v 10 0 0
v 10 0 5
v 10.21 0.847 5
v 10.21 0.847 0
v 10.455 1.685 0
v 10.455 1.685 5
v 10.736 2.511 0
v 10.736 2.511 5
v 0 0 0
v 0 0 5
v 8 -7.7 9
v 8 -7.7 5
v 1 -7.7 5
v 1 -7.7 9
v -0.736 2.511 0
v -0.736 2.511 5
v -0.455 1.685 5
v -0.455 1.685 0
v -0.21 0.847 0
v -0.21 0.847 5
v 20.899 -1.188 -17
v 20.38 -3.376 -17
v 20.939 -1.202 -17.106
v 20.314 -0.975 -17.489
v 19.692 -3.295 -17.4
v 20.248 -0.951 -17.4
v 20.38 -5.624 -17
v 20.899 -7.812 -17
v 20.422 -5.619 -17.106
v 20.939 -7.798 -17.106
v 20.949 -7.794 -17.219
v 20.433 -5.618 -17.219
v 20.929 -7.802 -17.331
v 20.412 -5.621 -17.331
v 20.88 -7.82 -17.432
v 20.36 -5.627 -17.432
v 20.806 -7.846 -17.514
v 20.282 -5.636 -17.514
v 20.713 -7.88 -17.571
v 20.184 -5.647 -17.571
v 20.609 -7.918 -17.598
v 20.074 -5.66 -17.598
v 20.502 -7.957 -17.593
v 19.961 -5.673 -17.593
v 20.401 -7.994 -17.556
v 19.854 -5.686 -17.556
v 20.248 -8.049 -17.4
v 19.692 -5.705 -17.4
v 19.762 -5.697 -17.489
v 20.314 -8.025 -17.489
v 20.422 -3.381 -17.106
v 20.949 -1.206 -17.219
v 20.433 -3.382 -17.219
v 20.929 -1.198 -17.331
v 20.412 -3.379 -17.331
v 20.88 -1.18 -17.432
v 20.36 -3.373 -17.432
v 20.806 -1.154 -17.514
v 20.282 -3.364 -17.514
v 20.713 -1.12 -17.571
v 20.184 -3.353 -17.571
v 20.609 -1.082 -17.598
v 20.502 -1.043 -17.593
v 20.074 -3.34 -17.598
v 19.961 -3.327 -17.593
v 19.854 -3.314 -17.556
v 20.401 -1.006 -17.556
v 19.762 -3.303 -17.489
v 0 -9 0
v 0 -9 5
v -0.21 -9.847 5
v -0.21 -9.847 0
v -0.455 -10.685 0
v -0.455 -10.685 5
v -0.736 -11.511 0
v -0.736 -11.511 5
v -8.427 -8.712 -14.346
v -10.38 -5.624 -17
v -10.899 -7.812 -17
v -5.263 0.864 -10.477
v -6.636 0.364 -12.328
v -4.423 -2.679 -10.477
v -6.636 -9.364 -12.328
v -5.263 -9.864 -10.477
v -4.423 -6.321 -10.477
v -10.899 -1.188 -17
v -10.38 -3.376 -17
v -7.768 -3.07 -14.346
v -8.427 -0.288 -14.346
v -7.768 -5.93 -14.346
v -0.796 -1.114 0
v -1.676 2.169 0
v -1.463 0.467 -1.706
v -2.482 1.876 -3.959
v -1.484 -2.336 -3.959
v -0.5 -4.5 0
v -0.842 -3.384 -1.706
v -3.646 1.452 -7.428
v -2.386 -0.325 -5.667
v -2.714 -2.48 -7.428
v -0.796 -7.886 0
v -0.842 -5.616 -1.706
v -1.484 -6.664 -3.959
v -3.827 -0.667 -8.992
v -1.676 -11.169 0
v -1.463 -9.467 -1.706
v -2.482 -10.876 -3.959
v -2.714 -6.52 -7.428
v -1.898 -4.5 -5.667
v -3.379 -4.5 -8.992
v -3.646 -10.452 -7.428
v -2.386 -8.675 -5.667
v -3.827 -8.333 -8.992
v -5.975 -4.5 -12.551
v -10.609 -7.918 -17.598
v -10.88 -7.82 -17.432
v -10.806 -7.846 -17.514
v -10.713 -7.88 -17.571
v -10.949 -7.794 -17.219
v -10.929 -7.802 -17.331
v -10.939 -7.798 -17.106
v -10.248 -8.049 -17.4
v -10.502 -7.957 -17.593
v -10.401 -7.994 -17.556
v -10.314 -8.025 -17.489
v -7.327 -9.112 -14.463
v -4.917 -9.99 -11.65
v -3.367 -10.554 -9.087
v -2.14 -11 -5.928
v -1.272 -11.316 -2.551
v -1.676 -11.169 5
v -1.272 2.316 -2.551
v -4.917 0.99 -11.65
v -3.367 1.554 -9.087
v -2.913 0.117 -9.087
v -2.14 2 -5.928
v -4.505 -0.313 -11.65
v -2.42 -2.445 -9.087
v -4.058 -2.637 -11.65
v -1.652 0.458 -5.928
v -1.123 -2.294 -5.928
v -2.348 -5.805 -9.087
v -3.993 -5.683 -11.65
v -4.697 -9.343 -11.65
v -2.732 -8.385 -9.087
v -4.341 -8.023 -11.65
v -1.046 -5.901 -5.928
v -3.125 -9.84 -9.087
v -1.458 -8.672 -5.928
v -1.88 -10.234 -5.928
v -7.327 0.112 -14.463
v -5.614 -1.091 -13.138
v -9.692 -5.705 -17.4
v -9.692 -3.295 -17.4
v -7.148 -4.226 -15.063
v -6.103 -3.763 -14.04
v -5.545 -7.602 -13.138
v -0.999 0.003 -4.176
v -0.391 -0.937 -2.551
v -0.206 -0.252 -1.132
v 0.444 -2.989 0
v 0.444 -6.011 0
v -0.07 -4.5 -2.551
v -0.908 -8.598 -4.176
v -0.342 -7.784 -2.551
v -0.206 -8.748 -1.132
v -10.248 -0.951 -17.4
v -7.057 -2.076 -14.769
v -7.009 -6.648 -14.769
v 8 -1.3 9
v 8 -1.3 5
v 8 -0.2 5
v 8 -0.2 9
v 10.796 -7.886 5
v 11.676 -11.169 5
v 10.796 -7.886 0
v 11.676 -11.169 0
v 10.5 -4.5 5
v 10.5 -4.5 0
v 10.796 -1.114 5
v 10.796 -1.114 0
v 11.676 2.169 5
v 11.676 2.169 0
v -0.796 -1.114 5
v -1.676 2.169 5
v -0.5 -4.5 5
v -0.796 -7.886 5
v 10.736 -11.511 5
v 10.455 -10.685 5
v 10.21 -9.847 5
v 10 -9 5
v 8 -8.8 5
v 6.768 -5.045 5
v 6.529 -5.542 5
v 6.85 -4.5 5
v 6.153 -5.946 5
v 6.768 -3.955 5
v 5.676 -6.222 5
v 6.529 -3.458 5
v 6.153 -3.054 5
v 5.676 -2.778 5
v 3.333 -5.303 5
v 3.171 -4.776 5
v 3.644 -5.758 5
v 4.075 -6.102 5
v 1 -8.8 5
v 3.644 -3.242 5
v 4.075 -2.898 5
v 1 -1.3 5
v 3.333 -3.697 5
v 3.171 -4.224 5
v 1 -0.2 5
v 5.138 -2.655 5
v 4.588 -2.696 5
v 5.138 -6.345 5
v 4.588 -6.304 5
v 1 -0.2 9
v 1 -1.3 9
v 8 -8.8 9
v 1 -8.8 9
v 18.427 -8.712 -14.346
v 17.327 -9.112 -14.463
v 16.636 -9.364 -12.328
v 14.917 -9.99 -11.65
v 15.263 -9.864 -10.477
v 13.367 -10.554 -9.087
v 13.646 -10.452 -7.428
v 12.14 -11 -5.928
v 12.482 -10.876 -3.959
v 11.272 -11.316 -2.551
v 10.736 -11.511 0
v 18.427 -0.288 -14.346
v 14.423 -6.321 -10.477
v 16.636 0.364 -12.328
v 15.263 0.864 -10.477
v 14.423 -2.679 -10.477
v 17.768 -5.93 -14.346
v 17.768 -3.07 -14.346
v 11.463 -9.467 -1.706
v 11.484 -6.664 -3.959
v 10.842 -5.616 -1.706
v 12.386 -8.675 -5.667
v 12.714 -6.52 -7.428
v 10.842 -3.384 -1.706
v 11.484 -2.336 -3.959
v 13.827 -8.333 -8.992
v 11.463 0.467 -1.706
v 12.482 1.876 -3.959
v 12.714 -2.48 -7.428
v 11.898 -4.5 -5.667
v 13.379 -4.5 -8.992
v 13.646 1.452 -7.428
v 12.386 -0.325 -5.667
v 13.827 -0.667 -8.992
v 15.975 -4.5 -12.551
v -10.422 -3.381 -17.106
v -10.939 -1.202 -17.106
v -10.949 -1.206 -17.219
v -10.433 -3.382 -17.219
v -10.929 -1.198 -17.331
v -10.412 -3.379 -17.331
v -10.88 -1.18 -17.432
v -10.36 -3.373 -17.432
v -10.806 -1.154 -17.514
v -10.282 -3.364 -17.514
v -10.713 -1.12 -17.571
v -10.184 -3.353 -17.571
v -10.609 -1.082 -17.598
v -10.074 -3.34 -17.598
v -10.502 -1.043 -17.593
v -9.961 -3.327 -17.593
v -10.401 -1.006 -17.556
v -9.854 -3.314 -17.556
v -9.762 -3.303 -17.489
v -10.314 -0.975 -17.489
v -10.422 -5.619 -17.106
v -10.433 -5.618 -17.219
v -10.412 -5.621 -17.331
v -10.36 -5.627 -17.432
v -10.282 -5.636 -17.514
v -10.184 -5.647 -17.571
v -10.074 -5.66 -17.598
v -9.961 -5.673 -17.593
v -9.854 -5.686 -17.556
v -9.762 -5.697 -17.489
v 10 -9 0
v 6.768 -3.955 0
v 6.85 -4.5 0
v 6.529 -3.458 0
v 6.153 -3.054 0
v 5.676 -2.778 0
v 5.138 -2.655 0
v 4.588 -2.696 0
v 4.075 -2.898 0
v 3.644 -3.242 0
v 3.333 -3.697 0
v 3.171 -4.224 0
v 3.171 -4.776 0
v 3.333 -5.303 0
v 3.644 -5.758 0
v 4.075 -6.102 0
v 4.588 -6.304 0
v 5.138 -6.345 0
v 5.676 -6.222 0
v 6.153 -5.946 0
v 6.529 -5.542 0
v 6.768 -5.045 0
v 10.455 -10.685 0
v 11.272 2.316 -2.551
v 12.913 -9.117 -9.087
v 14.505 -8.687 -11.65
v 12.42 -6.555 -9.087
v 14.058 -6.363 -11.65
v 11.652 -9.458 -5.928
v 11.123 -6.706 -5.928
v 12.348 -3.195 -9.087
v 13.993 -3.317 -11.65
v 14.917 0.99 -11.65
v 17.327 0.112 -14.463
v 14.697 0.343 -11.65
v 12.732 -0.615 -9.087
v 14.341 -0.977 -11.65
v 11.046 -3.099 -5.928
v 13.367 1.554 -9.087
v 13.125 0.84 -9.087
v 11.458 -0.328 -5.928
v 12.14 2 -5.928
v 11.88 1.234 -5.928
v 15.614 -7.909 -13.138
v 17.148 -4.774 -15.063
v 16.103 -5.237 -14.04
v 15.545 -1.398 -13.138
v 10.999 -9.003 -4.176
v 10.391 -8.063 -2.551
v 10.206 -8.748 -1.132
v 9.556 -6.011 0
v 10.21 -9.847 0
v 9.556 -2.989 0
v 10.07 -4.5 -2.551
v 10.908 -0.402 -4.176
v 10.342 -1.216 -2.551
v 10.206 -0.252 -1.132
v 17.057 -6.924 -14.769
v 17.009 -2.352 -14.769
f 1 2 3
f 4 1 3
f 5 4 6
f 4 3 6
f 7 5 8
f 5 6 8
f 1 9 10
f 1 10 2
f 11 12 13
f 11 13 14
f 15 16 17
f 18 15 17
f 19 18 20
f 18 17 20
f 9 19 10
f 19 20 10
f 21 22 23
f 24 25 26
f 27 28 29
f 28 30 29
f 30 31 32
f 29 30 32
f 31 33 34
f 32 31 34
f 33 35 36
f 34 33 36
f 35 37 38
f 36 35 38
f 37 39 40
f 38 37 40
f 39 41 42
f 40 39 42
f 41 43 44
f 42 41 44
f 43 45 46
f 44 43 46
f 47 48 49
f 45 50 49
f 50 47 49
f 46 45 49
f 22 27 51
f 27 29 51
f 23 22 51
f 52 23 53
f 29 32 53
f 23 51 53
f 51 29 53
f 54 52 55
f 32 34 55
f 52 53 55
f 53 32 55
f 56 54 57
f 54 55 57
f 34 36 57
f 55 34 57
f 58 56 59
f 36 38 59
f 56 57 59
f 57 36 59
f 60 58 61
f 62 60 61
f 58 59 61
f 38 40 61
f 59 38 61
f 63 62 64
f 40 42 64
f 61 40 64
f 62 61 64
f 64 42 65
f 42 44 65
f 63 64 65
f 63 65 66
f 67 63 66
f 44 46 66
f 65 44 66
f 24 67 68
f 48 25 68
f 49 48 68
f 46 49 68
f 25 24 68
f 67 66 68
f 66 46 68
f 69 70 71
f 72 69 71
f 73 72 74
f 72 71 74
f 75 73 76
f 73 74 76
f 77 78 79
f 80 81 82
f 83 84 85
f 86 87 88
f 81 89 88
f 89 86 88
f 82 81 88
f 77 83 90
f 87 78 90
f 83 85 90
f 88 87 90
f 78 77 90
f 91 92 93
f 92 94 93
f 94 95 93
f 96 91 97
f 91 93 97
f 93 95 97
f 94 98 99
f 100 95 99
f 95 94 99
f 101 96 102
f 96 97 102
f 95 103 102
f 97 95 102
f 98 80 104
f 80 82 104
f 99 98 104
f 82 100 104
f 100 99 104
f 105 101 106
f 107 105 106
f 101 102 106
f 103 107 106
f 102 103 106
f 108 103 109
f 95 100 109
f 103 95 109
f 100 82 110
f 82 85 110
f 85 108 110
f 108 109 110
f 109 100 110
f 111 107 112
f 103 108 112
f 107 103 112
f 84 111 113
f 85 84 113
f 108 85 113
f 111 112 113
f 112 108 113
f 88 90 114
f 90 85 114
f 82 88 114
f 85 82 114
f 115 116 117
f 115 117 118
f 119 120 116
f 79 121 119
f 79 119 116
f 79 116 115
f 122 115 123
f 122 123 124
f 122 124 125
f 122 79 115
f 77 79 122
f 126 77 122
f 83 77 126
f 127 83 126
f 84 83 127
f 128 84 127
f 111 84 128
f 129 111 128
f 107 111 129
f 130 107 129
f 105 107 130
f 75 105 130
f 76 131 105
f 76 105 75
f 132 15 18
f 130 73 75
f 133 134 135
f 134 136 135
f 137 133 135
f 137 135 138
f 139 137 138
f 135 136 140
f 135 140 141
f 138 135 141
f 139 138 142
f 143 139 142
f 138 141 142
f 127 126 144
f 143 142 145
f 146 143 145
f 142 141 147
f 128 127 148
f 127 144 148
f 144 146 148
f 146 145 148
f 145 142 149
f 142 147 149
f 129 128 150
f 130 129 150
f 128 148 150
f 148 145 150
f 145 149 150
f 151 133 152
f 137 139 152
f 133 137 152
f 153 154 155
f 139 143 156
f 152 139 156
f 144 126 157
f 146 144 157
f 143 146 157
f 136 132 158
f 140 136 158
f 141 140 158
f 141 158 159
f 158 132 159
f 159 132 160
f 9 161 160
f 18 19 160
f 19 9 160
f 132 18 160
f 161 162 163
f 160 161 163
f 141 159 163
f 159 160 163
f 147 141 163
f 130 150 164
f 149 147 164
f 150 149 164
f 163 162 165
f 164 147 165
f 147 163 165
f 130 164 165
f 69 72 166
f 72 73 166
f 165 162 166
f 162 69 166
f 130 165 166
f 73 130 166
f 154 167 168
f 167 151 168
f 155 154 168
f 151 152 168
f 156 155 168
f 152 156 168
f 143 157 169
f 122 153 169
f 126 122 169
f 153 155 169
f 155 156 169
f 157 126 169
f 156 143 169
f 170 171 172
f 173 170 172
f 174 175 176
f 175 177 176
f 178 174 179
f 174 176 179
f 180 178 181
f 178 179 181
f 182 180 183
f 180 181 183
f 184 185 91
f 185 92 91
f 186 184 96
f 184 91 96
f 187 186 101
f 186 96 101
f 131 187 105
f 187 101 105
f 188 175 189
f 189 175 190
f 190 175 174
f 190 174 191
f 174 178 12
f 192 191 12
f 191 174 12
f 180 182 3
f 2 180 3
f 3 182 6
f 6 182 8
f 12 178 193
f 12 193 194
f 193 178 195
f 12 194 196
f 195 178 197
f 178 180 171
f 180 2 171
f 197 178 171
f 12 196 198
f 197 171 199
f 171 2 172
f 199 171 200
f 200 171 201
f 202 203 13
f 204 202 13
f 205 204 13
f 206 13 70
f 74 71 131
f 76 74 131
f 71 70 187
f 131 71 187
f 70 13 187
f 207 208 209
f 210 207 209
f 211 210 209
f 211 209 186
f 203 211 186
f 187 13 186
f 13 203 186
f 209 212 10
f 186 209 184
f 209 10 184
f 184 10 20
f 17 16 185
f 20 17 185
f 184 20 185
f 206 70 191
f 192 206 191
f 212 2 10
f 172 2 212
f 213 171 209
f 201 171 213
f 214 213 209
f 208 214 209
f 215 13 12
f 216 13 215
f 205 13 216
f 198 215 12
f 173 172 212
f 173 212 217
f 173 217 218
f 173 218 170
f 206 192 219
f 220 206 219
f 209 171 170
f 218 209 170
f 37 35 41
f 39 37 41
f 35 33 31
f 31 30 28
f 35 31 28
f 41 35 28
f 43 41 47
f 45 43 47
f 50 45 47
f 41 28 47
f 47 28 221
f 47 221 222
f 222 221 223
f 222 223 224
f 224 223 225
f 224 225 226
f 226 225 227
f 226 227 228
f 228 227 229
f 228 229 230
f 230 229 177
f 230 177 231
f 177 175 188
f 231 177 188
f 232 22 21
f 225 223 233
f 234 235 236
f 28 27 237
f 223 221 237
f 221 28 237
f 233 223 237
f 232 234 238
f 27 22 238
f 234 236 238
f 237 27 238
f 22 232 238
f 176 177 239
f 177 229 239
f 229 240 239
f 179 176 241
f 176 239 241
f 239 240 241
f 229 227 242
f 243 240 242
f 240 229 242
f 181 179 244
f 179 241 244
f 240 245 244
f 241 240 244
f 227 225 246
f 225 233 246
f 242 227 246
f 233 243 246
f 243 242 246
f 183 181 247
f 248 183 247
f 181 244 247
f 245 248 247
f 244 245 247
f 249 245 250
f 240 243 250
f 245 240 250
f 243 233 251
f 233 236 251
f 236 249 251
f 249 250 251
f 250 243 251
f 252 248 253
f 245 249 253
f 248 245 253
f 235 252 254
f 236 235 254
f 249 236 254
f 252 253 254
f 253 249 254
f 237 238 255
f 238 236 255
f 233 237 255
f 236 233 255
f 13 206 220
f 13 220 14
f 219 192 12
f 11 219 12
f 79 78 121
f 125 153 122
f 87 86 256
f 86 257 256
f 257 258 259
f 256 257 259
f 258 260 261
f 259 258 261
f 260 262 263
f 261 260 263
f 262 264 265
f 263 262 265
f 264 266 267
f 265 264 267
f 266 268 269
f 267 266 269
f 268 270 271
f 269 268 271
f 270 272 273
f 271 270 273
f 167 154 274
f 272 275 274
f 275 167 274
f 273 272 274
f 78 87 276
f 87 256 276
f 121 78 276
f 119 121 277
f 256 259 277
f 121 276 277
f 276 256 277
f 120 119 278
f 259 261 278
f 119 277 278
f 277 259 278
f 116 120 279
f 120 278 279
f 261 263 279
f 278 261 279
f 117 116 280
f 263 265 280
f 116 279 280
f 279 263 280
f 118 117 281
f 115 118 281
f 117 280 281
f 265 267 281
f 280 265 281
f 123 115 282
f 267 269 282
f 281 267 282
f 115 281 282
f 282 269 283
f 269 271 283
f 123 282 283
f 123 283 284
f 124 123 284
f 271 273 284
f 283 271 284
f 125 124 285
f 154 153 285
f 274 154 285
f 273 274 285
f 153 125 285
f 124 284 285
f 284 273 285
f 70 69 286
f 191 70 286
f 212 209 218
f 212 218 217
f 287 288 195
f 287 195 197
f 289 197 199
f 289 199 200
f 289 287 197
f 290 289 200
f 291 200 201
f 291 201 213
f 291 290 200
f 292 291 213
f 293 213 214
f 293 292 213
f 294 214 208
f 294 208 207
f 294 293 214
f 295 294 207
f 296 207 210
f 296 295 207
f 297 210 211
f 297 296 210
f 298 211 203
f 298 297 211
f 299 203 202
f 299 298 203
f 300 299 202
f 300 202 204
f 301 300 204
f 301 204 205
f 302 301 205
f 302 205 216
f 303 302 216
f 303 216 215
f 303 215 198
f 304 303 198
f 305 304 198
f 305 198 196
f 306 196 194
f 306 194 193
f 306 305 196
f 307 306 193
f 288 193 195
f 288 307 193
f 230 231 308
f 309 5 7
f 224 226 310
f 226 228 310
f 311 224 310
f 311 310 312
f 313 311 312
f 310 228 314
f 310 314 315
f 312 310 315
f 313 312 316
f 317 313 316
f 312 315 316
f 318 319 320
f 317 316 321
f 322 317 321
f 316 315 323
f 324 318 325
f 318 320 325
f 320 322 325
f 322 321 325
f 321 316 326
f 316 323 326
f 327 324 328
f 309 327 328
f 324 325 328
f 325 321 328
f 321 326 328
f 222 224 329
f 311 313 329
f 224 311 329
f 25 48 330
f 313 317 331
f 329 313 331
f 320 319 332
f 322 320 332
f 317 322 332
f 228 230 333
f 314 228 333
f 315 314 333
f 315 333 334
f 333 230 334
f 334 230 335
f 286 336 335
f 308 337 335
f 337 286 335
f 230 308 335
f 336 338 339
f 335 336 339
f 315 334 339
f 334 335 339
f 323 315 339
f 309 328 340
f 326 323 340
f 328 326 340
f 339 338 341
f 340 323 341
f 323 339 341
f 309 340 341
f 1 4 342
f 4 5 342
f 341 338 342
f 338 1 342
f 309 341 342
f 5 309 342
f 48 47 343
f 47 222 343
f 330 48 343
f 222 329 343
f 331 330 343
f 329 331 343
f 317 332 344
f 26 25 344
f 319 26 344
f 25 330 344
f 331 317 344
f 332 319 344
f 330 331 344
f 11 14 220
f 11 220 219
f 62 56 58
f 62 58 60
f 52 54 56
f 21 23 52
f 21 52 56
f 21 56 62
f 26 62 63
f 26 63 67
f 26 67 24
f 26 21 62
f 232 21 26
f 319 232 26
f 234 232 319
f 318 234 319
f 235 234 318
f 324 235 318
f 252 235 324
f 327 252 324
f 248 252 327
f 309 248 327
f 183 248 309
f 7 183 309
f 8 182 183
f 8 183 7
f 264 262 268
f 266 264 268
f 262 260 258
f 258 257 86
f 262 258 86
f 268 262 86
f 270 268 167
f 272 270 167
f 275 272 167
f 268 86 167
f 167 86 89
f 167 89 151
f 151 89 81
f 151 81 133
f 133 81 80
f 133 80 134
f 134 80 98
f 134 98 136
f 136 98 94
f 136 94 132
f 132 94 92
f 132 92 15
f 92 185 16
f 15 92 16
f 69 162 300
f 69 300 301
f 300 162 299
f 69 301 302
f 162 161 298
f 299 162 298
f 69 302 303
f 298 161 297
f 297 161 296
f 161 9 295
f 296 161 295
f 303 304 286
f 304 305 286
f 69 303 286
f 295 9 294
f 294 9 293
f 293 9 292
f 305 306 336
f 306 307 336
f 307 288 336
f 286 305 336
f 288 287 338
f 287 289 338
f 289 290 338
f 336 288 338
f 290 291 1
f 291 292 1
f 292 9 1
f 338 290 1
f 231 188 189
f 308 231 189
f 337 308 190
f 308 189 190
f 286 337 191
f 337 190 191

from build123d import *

# Parameters (mm, degrees)
F0_W          = 10
F0_H          = 9
F0_R          = 1.85
F1_DEPTH      = 5
F5_ANGLE_BACK = 20
F5_ANGLE      = 40
F6_W          = 7
F6_H          = 1.5
F7_DEPTH      = 4
F8_W          = 0.2
F8_H          = 4
F9_DEPTH      = 25
F10_COUNT     = 2


with BuildPart() as f1:
    # F0 (on Top) → F1 (new body)
    with BuildSketch(Plane.XY):
        with Locations((5, -4.5)):
            Rectangle(F0_W, F0_H)
        with Locations((5, -4.5)):
            Circle(F0_R, mode=Mode.SUBTRACT)
    extrude(amount=F1_DEPTH)

    # F6 (on face) → F7 (join)
    with BuildSketch(Plane.XY.offset(5)):
        with Locations((4.5, -8.25)):
            Rectangle(F6_W, F6_H)
        with Locations((4.5, -0.75)):
            Rectangle(F6_W, F6_H)
    extrude(amount=F7_DEPTH)

    # F8 (on face) → F9 (cut)
    with BuildSketch(Plane.YZ.offset(10)):
        with Locations((-7.6, 7)):
            Rectangle(F8_W, F8_H)
        with Locations((-8.9, 7)):
            Rectangle(F8_W, F8_H)
        with Locations((-0.1, 7)):
            Rectangle(F8_W, F8_H)
        with Locations((-1.4, 7)):
            Rectangle(F8_W, F8_H)
    extrude(amount=-F9_DEPTH, mode=Mode.SUBTRACT)



with BuildPart() as f5:
    # F3 (on offset) → F5 (revolve)
    with BuildSketch(Plane.XZ.offset(4.5), mode=Mode.PRIVATE) as f5_sk:
        with BuildLine():
            Line((0.5, 5), (0, 5))
            Line((0, 5), (-0.5, 5))
            Line((-0.5, 5), (-0.5, 0))
            add(Edge.make_bspline(
                [(-0.5, 0), (-0.7940392474, -1.8718490053), (-2.3993364256, -10.2948176613), (-9.1089938236, -15.538515672), (-10.3149545762, -17)],
                knots=[0, 0, 0, 0, 0.5, 1, 1, 1, 1], degree=3))
            ThreePointArc((-10.3149545762, -17), (-10.1685444147, -17.5464101615), (-9.6221342532, -17.4))
            add(Edge.make_bspline(
                [(-9.6221342532, -17.4), (-8.3348966668, -15.9883498775), (-1.3566520207, -10.8349816991), (0.0036717937, -2.0199950425), (0.5, 0)],
                knots=[0, 0, 0, 0, 0.4942337757, 1, 1, 1, 1], degree=3))
            Line((0.5, 0), (0.5, 5))
        make_face()
    revolve(f5_sk.sketch.rotate(Axis((-20, -4.5, 1.4354154991), (0, 0, -1)), -F5_ANGLE_BACK), axis=Axis((-20, -4.5, 1.4354154991), (0, 0, -1)), revolution_arc=F5_ANGLE)


with BuildPart() as f1_1:
    add(f1.part)

    add(f5.part)  # F10 merges F5
    # F10: F5 ×2 about axis
    f10_axis = Axis((5, -4.5, 0), (0, 0, -1))
    for i in range(1, F10_COUNT):
        add(f5.part.rotate(f10_axis, i * 360 / F10_COUNT))


solid = f1_1.part
